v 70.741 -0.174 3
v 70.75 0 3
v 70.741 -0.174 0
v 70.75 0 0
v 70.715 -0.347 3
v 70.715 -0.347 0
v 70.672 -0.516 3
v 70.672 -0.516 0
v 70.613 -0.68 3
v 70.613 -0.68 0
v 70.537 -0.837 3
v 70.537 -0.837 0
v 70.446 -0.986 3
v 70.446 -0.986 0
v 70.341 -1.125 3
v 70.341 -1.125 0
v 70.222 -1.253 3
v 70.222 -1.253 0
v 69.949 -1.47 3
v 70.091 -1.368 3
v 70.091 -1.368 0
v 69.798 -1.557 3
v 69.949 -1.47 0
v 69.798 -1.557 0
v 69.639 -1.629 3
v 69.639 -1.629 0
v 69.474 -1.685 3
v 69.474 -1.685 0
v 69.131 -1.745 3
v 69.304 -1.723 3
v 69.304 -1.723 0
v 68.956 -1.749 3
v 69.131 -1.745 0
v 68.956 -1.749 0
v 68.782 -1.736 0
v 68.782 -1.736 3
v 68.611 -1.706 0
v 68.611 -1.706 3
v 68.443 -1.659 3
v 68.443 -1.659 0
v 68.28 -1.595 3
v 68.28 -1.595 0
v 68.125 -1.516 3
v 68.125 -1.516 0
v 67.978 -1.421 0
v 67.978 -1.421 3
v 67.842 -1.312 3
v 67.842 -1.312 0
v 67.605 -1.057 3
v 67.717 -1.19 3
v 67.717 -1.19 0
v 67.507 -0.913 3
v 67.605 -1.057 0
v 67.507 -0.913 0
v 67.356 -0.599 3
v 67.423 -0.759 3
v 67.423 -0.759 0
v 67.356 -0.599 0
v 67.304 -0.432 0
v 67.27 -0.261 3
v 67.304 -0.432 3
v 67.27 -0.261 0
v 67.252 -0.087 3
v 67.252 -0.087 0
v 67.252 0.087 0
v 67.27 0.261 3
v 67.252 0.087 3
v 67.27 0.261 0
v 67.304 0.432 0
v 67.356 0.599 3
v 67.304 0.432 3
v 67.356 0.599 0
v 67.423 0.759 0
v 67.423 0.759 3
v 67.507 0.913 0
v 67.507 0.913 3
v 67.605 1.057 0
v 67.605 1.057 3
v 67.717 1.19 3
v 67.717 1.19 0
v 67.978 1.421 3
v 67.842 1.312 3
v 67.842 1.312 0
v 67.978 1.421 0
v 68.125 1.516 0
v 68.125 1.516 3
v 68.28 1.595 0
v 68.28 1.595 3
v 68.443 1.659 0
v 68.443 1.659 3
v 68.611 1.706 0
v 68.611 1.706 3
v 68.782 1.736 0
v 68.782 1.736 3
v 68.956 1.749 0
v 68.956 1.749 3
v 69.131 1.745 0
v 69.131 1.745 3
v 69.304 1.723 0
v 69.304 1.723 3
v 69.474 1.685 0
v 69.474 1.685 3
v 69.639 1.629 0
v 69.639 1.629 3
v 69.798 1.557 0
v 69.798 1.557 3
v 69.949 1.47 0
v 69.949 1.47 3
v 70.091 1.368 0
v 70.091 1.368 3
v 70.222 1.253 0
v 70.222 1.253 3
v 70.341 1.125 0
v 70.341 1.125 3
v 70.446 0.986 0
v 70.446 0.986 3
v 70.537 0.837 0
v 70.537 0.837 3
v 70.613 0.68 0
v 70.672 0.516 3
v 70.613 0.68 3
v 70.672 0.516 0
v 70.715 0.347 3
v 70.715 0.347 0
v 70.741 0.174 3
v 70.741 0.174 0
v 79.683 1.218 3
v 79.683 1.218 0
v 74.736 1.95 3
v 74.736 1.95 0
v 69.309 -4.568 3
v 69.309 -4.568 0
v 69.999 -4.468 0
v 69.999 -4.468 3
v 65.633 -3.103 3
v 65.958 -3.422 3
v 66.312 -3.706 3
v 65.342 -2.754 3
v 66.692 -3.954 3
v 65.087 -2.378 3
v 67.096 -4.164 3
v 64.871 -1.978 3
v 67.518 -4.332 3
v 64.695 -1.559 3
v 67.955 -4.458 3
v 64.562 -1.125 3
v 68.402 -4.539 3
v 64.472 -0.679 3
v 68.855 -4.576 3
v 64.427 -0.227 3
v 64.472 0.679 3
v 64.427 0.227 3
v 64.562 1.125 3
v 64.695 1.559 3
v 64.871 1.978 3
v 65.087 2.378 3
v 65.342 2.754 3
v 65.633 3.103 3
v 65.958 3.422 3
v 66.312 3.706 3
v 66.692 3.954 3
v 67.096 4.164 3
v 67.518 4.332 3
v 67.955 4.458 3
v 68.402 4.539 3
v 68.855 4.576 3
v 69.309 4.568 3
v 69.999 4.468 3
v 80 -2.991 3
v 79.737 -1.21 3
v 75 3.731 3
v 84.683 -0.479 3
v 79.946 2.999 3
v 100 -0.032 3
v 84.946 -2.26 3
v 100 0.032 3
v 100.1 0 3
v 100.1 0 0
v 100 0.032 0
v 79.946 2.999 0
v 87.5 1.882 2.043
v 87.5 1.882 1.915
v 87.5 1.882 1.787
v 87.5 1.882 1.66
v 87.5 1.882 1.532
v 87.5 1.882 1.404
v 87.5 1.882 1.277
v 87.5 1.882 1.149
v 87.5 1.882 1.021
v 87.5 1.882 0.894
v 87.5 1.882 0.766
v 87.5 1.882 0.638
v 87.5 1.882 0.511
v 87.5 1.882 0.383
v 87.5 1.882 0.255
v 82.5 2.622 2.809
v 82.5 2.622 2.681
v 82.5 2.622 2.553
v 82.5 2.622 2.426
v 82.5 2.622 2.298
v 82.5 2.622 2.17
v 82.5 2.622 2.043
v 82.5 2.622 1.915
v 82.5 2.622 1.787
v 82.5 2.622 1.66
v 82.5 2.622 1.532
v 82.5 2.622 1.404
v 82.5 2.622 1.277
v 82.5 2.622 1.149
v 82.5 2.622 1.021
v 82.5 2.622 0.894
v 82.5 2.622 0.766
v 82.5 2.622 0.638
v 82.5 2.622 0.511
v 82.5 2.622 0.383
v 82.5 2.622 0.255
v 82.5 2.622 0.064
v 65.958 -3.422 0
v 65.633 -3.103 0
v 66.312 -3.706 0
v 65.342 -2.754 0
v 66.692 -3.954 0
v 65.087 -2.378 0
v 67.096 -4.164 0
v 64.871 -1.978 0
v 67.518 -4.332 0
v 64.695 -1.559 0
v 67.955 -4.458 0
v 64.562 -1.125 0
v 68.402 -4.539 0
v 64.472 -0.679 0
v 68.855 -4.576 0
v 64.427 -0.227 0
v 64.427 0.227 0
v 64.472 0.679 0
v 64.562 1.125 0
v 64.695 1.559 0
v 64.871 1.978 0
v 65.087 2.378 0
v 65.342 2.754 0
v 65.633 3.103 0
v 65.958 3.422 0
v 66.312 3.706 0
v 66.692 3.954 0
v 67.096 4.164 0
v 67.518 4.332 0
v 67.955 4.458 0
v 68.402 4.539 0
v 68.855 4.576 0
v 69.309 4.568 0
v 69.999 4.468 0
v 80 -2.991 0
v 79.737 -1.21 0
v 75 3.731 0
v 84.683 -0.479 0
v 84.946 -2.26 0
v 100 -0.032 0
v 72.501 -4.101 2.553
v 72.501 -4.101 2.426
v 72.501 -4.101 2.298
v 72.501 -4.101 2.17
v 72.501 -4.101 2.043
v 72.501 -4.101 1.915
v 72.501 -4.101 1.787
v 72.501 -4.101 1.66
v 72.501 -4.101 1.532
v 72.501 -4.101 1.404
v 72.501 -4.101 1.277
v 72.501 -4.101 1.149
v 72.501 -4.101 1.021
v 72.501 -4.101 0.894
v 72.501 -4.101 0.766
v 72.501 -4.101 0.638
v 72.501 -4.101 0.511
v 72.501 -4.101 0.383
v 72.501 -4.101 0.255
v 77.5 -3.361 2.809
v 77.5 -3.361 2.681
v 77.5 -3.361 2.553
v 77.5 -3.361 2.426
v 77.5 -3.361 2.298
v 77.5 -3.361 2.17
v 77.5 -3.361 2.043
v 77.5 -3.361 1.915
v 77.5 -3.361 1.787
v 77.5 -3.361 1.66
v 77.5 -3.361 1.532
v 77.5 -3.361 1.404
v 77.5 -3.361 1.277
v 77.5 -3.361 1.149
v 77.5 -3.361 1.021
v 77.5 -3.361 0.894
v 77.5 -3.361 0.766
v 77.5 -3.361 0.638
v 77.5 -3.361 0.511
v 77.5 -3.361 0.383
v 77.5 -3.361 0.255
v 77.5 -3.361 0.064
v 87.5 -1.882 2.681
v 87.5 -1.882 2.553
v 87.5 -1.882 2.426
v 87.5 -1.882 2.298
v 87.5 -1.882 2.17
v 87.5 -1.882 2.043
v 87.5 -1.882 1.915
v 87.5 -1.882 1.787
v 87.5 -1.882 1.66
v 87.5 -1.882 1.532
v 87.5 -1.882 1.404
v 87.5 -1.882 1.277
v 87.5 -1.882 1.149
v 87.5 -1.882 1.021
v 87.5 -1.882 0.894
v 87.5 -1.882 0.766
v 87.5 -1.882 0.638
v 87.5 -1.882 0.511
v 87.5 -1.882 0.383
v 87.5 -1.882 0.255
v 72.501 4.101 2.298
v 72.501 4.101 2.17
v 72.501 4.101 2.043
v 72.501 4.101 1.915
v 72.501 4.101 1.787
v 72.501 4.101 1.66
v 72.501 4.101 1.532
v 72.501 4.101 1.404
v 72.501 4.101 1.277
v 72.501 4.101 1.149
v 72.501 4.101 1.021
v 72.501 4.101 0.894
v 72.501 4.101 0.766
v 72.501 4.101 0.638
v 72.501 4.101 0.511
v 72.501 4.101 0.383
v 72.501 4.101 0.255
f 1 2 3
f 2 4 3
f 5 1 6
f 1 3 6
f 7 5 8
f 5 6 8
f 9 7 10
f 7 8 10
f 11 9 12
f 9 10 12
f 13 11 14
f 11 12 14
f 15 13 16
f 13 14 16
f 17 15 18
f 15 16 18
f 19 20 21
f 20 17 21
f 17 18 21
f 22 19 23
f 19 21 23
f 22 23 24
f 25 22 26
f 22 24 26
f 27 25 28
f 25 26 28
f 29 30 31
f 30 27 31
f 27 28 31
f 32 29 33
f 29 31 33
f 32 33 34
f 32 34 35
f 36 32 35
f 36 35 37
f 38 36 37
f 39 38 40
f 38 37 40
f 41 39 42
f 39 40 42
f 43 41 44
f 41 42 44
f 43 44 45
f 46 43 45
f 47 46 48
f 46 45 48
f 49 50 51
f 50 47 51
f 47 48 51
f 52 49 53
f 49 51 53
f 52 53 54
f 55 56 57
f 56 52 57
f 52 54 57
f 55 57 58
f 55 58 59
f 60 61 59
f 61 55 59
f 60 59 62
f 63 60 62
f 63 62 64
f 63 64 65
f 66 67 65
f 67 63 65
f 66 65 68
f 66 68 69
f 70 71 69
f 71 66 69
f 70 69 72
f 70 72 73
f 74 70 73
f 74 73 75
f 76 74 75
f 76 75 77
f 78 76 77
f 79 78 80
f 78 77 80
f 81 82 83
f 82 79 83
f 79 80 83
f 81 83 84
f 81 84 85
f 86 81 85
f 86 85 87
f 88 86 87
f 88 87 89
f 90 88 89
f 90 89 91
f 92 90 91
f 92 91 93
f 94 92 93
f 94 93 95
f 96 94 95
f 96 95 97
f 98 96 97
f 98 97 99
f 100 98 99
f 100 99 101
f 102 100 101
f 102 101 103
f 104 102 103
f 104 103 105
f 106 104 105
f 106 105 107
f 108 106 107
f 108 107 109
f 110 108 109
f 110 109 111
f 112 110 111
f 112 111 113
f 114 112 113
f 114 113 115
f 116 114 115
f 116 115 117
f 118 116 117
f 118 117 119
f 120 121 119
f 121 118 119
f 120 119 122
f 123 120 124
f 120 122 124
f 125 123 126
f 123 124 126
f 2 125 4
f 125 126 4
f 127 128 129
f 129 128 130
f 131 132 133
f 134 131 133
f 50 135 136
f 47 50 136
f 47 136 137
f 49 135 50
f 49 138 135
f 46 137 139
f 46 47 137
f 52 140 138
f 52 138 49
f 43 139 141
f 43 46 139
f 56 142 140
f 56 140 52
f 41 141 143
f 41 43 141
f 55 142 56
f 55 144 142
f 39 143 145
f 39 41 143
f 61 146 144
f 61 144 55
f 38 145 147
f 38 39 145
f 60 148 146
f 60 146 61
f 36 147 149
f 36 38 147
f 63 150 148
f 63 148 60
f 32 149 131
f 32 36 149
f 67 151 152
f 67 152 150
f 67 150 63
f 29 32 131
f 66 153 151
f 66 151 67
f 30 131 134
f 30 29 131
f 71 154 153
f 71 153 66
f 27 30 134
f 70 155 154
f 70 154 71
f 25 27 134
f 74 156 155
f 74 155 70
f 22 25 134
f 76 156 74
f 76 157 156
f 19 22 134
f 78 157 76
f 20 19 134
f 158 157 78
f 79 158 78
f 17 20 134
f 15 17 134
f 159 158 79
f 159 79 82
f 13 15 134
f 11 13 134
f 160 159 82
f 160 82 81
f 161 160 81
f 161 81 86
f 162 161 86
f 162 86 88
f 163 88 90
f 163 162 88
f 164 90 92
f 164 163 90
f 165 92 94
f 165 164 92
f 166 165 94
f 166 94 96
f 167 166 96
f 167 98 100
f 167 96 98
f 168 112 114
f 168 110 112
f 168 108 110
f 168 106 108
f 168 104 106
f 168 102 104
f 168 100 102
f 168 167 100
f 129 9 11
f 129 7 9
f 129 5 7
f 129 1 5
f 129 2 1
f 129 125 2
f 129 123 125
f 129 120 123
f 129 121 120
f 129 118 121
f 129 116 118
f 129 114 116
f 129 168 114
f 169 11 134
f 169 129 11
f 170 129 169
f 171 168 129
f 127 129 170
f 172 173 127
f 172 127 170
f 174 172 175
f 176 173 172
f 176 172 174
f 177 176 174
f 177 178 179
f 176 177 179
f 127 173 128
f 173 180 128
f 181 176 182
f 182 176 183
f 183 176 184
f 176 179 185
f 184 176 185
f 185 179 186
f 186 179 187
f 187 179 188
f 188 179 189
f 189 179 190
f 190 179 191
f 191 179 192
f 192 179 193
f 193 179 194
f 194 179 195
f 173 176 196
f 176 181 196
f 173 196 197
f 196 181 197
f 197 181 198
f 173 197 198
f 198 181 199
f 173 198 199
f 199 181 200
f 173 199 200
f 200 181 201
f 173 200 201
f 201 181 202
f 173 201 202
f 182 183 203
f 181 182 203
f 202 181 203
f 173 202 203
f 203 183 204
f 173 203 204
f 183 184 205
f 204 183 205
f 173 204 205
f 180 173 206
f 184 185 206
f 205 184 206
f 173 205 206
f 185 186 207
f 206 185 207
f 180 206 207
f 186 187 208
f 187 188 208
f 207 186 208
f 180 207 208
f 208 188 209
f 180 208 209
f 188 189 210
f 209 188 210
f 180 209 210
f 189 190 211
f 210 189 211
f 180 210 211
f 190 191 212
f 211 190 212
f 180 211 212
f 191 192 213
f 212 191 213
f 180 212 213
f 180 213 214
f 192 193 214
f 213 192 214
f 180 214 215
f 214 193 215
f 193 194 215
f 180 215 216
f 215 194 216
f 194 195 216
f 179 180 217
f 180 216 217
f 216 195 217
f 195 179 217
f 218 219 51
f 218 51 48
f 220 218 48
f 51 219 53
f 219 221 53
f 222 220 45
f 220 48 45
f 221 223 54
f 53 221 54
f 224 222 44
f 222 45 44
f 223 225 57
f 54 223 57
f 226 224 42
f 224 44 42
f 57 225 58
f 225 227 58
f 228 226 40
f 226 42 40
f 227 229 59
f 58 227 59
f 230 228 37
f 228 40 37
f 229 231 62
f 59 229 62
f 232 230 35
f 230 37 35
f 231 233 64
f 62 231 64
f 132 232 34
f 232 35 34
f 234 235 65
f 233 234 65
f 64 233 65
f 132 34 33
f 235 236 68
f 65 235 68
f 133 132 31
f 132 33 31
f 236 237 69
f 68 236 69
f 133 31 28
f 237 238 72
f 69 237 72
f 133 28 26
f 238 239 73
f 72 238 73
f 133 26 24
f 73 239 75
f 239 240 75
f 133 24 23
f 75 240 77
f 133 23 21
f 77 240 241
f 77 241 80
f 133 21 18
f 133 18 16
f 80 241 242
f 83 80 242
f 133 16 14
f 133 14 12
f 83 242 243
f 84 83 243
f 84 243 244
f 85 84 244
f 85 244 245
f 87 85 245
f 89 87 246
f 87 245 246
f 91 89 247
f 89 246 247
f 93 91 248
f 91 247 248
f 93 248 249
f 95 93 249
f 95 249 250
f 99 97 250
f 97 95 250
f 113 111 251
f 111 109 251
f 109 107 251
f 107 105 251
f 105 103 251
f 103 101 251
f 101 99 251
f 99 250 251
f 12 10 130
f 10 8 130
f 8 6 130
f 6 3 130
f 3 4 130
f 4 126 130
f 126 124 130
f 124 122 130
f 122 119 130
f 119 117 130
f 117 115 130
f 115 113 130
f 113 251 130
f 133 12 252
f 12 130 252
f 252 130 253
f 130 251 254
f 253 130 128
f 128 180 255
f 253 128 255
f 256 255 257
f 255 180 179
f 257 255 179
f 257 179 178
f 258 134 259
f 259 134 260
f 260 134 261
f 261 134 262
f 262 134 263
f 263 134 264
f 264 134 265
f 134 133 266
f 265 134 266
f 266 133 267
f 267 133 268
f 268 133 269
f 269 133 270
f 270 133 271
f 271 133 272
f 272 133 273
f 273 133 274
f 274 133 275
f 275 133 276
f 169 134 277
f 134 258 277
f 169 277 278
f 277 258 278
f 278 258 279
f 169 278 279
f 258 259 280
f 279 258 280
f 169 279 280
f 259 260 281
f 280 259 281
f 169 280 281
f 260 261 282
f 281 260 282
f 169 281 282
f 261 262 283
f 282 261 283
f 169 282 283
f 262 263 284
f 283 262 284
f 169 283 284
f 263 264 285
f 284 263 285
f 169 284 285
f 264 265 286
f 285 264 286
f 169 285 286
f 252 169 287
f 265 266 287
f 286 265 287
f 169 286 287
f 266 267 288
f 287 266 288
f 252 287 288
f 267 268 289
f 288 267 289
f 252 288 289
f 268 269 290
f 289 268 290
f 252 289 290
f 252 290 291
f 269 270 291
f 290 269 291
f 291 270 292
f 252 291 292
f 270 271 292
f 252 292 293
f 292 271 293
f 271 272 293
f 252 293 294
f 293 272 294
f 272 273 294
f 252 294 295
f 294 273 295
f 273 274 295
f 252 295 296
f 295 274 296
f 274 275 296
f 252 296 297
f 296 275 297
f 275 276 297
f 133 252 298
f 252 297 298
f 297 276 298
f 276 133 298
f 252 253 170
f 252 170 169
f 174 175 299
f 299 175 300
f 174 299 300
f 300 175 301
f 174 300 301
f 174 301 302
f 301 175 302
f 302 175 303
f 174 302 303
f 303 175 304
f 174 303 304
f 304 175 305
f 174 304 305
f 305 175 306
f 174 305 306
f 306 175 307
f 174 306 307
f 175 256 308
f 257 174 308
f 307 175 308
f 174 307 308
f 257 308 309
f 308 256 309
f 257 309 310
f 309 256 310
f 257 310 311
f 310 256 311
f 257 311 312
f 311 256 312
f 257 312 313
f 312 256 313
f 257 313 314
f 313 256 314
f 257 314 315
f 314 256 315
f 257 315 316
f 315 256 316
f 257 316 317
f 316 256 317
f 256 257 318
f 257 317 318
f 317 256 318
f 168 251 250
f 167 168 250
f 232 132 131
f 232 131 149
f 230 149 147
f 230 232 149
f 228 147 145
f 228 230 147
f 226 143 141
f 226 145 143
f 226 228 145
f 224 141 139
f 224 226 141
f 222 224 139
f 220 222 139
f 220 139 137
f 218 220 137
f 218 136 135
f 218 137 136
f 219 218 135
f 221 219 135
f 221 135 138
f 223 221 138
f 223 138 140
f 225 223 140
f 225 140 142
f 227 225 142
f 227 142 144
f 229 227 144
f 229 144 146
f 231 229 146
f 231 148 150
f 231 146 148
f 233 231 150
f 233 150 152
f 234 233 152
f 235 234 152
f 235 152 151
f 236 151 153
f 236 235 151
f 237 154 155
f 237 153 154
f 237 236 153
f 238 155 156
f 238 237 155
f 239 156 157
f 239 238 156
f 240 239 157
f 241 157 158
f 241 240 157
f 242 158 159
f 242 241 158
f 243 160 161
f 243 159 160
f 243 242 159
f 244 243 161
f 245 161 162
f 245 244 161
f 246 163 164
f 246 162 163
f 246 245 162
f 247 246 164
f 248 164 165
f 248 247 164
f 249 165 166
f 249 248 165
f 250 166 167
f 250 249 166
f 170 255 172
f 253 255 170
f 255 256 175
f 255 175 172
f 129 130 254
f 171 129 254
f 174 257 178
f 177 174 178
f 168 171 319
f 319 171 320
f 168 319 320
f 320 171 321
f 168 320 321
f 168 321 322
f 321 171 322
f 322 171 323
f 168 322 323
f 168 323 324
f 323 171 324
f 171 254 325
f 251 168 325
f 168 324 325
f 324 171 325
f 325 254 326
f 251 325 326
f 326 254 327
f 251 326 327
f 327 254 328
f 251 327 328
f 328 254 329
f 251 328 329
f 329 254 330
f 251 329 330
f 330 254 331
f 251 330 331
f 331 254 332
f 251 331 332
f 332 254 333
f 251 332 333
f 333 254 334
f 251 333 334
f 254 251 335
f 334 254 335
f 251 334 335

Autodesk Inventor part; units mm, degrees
ref_plane "YZ Plane" through (0, 0, 0) normal (1, 0, 0) x (0, 1, 0)
ref_plane "XZ Plane" through (0, 0, 0) normal (0, 1, 0) x (-1, 0, 0)
ref_plane "XY Plane" through (0, 0, 0) normal (0, 0, 1) x (1, 0, 0)
sketch "Sketch1" plane through (0, 0, 0) normal (0, 0, 1) x (1, 0, 0)
  spline S0 degree 4 poles (100, 0.032) (96.875, 0.4949) (92.5, 1.1413) (86.8751, 1.9754) (80.0002, 2.991) (75.0008, 3.7295) (70.0033, 4.4751) (65.0053, 5.1842) (60.0066, 5.8364) (55.0071, 6.4061) (50.0063, 6.8809) (45.0061, 7.2433) (40.0008, 7.4683) (35.0047, 7.533) (29.9791, 7.4197) (25.0319, 7.1346) (19.9582, 6.6428) (15.6359, 6.1039) (10.2184, 5.101) (7.8303, 4.4733) (5.3127, 3.8052) (2.8544, 2.7785) (1.5003, 2.0987) (0.6956, 1.3847) (0.5171, 1.2937) (-0.3402, 0) (0.5171, -1.2937) (0.6956, -1.3847) (1.5003, -2.0987) (2.8544, -2.7785) (5.3127, -3.8052) (7.8303, -4.4733) (10.2184, -5.101) (15.6359, -6.1039) (19.9582, -6.6428) (25.0319, -7.1346) (29.9791, -7.4197) (35.0047, -7.533) (40.0008, -7.4683) (45.0061, -7.2433) (50.0063, -6.8809) (55.0071, -6.4061) (60.0066, -5.8364) (65.0053, -5.1842) (70.0033, -4.4751) (75.0008, -3.7295) (80.0002, -2.991) (86.8751, -1.9754) (92.5, -1.1413) (96.875, -0.4949) (100, -0.032) knots 0 0 0 0 0 0.057355 0.080296 0.103238 0.126177 0.149108 0.172027 0.194928 0.217807 0.240666 0.263507 0.286336 0.309162 0.331999 0.354861 0.377772 0.399068 0.418771 0.436942 0.45243 0.465861 0.476678 0.486208 0.495579 0.504421 0.513792 0.523322 0.534139 0.54757 0.563058 0.581229 0.600932 0.622228 0.645139 0.668001 0.690838 0.713664 0.736493 0.759334 0.782193 0.805072 0.827973 0.850892 0.873823 0.896762 0.919704 0.942645 1 1 1 1 1
  circle A0 centre (26, 0) radius 2.5
  circle A1 centre (4, 0) radius 1.75
  circle A2 centre (69, 0) radius 1.75
  spline S1 degree 5 poles (8.9035, 0.2296) (9.2434, 0.8899) (11.3643, 2.0291) (18.2315, 3.5428) (20.2721, 2.9595) (23.0162, -3.0821) (16.5301, -2.3219) (12.7289, -2.0151) (9.2115, -1.112) (8.6356, -0.2907) (8.9035, 0.2296) knots 0 0 0 0 0 0 0.227523 0.364622 0.543771 0.698813 0.820709 1 1 1 1 1 1
  spline S2 degree 5 poles (31.2707, 2.5) (32.7339, 3.9218) (37.2285, 5.1212) (48.2817, 2.605) (61.2094, 6.6741) (64.3828, -5.6022) (45.0929, -1.179) (33.1446, -7.1128) (29.4849, -1.5962) (30.0097, 1.2748) (31.2707, 2.5) knots 0 0 0 0 0 0 0.215917 0.355077 0.532597 0.692902 0.813935 1 1 1 1 1 1
  line L0 (100, -0.032) -> (100.1, 0)
  line L1 (100.1, 0) -> (100, 0.032)
  circle A3 centre (69, 0) radius 4.5785
  line L2 (75, 3.731) -> (79.9461, 2.999)
  line L3 (79.9461, 2.999) -> (79.6826, 1.2184)
  line L4 (79.6826, 1.2184) -> (74.7365, 1.9504)
  line L5 (74.7365, 1.9504) -> (75, 3.731)
  line L6 (80, -2.991) -> (84.9463, -2.2599)
  line L7 (84.9463, -2.2599) -> (84.6831, -0.4793)
  line L8 (84.6831, -0.4793) -> (79.7368, -1.2103)
  line L9 (79.7368, -1.2103) -> (80, -2.991)
  point P0 (0, 0)
  point P1 (95, 0.772)
  point P2 (90, 1.512)
  point P3 (85, 2.252)
  point P4 (80, 2.991)
  point P5 (70, 4.468)
  point P6 (65, 5.173)
  point P7 (60, 5.82)
  point P8 (55, 6.387)
  point P9 (50, 6.858)
  point P10 (45, 7.215)
  point P11 (40, 7.435)
  point P12 (35, 7.496)
  point P13 (30, 7.384)
  point P14 (25, 7.091)
  point P15 (20, 6.619)
  point P16 (15, 5.942)
  point P17 (10, 4.997)
  point P18 (7.5, 4.382)
  point P19 (5, 3.618)
  point P20 (2.5, 2.579)
  point P21 (1.25, 1.844)
  point P22 (0.75, 1.448)
  point P23 (0.5, 1.203)
  point P24 (0, 0)
  point P25 (0.5, -1.203)
  point P26 (0.75, -1.448)
  point P27 (1.25, -1.844)
  point P28 (2.5, -2.579)
  point P29 (5, -3.618)
  point P30 (7.5, -4.382)
  point P31 (10, -4.997)
  point P32 (15, -5.942)
  point P33 (20, -6.619)
  point P34 (25, -7.091)
  point P35 (30, -7.384)
  point P36 (35, -7.496)
  point P37 (40, -7.435)
  point P38 (45, -7.215)
  point P39 (50, -6.858)
  point P40 (55, -6.387)
  point P41 (60, -5.82)
  point P42 (65, -5.173)
  point P43 (70, -4.468)
  point P44 (75, -3.731)
  point P45 (80, -2.991)
  point P46 (85, -2.252)
  point P47 (90, -1.512)
  point P48 (95, -0.772)
  point P49 (20.5674, 1.203)
  point P50 (21.0369, -1.512)
  point P51 (16.8986, -2.3616)
  point P52 (10, -1.1013)
  point P53 (59.6934, 1.7909)
  point P54 (60.4025, -1.203)
  point P55 (44.4534, -3.7857)
  point P56 (31.0165, -2.1426)
  point P57 (70, -4.468)
  point P58 (69.3082, 4.5682)
  point P59 (69.3082, -4.5682)
  dimension "d0" = 5
  dimension "d1" = 3.5
  dimension "d2" = 3.5
  dimension "d3" = 26
  dimension "d4" = 22
  dimension "d5" = 43
  dimension "d6" = 0.1
  dimension "d9" = 5
  dimension "d10" = 1.8
  dimension "d11" = 5
  dimension "d12" = 1.8
extrude "Extrusion1" add sketch "Sketch1" along normal blind 3 contours L1 L0 S0 L7 L8 L9 A3 L5 L4 L3 | A3 S0 picked at (65.4059, -0.3539)
properties part number "Tlotka"
